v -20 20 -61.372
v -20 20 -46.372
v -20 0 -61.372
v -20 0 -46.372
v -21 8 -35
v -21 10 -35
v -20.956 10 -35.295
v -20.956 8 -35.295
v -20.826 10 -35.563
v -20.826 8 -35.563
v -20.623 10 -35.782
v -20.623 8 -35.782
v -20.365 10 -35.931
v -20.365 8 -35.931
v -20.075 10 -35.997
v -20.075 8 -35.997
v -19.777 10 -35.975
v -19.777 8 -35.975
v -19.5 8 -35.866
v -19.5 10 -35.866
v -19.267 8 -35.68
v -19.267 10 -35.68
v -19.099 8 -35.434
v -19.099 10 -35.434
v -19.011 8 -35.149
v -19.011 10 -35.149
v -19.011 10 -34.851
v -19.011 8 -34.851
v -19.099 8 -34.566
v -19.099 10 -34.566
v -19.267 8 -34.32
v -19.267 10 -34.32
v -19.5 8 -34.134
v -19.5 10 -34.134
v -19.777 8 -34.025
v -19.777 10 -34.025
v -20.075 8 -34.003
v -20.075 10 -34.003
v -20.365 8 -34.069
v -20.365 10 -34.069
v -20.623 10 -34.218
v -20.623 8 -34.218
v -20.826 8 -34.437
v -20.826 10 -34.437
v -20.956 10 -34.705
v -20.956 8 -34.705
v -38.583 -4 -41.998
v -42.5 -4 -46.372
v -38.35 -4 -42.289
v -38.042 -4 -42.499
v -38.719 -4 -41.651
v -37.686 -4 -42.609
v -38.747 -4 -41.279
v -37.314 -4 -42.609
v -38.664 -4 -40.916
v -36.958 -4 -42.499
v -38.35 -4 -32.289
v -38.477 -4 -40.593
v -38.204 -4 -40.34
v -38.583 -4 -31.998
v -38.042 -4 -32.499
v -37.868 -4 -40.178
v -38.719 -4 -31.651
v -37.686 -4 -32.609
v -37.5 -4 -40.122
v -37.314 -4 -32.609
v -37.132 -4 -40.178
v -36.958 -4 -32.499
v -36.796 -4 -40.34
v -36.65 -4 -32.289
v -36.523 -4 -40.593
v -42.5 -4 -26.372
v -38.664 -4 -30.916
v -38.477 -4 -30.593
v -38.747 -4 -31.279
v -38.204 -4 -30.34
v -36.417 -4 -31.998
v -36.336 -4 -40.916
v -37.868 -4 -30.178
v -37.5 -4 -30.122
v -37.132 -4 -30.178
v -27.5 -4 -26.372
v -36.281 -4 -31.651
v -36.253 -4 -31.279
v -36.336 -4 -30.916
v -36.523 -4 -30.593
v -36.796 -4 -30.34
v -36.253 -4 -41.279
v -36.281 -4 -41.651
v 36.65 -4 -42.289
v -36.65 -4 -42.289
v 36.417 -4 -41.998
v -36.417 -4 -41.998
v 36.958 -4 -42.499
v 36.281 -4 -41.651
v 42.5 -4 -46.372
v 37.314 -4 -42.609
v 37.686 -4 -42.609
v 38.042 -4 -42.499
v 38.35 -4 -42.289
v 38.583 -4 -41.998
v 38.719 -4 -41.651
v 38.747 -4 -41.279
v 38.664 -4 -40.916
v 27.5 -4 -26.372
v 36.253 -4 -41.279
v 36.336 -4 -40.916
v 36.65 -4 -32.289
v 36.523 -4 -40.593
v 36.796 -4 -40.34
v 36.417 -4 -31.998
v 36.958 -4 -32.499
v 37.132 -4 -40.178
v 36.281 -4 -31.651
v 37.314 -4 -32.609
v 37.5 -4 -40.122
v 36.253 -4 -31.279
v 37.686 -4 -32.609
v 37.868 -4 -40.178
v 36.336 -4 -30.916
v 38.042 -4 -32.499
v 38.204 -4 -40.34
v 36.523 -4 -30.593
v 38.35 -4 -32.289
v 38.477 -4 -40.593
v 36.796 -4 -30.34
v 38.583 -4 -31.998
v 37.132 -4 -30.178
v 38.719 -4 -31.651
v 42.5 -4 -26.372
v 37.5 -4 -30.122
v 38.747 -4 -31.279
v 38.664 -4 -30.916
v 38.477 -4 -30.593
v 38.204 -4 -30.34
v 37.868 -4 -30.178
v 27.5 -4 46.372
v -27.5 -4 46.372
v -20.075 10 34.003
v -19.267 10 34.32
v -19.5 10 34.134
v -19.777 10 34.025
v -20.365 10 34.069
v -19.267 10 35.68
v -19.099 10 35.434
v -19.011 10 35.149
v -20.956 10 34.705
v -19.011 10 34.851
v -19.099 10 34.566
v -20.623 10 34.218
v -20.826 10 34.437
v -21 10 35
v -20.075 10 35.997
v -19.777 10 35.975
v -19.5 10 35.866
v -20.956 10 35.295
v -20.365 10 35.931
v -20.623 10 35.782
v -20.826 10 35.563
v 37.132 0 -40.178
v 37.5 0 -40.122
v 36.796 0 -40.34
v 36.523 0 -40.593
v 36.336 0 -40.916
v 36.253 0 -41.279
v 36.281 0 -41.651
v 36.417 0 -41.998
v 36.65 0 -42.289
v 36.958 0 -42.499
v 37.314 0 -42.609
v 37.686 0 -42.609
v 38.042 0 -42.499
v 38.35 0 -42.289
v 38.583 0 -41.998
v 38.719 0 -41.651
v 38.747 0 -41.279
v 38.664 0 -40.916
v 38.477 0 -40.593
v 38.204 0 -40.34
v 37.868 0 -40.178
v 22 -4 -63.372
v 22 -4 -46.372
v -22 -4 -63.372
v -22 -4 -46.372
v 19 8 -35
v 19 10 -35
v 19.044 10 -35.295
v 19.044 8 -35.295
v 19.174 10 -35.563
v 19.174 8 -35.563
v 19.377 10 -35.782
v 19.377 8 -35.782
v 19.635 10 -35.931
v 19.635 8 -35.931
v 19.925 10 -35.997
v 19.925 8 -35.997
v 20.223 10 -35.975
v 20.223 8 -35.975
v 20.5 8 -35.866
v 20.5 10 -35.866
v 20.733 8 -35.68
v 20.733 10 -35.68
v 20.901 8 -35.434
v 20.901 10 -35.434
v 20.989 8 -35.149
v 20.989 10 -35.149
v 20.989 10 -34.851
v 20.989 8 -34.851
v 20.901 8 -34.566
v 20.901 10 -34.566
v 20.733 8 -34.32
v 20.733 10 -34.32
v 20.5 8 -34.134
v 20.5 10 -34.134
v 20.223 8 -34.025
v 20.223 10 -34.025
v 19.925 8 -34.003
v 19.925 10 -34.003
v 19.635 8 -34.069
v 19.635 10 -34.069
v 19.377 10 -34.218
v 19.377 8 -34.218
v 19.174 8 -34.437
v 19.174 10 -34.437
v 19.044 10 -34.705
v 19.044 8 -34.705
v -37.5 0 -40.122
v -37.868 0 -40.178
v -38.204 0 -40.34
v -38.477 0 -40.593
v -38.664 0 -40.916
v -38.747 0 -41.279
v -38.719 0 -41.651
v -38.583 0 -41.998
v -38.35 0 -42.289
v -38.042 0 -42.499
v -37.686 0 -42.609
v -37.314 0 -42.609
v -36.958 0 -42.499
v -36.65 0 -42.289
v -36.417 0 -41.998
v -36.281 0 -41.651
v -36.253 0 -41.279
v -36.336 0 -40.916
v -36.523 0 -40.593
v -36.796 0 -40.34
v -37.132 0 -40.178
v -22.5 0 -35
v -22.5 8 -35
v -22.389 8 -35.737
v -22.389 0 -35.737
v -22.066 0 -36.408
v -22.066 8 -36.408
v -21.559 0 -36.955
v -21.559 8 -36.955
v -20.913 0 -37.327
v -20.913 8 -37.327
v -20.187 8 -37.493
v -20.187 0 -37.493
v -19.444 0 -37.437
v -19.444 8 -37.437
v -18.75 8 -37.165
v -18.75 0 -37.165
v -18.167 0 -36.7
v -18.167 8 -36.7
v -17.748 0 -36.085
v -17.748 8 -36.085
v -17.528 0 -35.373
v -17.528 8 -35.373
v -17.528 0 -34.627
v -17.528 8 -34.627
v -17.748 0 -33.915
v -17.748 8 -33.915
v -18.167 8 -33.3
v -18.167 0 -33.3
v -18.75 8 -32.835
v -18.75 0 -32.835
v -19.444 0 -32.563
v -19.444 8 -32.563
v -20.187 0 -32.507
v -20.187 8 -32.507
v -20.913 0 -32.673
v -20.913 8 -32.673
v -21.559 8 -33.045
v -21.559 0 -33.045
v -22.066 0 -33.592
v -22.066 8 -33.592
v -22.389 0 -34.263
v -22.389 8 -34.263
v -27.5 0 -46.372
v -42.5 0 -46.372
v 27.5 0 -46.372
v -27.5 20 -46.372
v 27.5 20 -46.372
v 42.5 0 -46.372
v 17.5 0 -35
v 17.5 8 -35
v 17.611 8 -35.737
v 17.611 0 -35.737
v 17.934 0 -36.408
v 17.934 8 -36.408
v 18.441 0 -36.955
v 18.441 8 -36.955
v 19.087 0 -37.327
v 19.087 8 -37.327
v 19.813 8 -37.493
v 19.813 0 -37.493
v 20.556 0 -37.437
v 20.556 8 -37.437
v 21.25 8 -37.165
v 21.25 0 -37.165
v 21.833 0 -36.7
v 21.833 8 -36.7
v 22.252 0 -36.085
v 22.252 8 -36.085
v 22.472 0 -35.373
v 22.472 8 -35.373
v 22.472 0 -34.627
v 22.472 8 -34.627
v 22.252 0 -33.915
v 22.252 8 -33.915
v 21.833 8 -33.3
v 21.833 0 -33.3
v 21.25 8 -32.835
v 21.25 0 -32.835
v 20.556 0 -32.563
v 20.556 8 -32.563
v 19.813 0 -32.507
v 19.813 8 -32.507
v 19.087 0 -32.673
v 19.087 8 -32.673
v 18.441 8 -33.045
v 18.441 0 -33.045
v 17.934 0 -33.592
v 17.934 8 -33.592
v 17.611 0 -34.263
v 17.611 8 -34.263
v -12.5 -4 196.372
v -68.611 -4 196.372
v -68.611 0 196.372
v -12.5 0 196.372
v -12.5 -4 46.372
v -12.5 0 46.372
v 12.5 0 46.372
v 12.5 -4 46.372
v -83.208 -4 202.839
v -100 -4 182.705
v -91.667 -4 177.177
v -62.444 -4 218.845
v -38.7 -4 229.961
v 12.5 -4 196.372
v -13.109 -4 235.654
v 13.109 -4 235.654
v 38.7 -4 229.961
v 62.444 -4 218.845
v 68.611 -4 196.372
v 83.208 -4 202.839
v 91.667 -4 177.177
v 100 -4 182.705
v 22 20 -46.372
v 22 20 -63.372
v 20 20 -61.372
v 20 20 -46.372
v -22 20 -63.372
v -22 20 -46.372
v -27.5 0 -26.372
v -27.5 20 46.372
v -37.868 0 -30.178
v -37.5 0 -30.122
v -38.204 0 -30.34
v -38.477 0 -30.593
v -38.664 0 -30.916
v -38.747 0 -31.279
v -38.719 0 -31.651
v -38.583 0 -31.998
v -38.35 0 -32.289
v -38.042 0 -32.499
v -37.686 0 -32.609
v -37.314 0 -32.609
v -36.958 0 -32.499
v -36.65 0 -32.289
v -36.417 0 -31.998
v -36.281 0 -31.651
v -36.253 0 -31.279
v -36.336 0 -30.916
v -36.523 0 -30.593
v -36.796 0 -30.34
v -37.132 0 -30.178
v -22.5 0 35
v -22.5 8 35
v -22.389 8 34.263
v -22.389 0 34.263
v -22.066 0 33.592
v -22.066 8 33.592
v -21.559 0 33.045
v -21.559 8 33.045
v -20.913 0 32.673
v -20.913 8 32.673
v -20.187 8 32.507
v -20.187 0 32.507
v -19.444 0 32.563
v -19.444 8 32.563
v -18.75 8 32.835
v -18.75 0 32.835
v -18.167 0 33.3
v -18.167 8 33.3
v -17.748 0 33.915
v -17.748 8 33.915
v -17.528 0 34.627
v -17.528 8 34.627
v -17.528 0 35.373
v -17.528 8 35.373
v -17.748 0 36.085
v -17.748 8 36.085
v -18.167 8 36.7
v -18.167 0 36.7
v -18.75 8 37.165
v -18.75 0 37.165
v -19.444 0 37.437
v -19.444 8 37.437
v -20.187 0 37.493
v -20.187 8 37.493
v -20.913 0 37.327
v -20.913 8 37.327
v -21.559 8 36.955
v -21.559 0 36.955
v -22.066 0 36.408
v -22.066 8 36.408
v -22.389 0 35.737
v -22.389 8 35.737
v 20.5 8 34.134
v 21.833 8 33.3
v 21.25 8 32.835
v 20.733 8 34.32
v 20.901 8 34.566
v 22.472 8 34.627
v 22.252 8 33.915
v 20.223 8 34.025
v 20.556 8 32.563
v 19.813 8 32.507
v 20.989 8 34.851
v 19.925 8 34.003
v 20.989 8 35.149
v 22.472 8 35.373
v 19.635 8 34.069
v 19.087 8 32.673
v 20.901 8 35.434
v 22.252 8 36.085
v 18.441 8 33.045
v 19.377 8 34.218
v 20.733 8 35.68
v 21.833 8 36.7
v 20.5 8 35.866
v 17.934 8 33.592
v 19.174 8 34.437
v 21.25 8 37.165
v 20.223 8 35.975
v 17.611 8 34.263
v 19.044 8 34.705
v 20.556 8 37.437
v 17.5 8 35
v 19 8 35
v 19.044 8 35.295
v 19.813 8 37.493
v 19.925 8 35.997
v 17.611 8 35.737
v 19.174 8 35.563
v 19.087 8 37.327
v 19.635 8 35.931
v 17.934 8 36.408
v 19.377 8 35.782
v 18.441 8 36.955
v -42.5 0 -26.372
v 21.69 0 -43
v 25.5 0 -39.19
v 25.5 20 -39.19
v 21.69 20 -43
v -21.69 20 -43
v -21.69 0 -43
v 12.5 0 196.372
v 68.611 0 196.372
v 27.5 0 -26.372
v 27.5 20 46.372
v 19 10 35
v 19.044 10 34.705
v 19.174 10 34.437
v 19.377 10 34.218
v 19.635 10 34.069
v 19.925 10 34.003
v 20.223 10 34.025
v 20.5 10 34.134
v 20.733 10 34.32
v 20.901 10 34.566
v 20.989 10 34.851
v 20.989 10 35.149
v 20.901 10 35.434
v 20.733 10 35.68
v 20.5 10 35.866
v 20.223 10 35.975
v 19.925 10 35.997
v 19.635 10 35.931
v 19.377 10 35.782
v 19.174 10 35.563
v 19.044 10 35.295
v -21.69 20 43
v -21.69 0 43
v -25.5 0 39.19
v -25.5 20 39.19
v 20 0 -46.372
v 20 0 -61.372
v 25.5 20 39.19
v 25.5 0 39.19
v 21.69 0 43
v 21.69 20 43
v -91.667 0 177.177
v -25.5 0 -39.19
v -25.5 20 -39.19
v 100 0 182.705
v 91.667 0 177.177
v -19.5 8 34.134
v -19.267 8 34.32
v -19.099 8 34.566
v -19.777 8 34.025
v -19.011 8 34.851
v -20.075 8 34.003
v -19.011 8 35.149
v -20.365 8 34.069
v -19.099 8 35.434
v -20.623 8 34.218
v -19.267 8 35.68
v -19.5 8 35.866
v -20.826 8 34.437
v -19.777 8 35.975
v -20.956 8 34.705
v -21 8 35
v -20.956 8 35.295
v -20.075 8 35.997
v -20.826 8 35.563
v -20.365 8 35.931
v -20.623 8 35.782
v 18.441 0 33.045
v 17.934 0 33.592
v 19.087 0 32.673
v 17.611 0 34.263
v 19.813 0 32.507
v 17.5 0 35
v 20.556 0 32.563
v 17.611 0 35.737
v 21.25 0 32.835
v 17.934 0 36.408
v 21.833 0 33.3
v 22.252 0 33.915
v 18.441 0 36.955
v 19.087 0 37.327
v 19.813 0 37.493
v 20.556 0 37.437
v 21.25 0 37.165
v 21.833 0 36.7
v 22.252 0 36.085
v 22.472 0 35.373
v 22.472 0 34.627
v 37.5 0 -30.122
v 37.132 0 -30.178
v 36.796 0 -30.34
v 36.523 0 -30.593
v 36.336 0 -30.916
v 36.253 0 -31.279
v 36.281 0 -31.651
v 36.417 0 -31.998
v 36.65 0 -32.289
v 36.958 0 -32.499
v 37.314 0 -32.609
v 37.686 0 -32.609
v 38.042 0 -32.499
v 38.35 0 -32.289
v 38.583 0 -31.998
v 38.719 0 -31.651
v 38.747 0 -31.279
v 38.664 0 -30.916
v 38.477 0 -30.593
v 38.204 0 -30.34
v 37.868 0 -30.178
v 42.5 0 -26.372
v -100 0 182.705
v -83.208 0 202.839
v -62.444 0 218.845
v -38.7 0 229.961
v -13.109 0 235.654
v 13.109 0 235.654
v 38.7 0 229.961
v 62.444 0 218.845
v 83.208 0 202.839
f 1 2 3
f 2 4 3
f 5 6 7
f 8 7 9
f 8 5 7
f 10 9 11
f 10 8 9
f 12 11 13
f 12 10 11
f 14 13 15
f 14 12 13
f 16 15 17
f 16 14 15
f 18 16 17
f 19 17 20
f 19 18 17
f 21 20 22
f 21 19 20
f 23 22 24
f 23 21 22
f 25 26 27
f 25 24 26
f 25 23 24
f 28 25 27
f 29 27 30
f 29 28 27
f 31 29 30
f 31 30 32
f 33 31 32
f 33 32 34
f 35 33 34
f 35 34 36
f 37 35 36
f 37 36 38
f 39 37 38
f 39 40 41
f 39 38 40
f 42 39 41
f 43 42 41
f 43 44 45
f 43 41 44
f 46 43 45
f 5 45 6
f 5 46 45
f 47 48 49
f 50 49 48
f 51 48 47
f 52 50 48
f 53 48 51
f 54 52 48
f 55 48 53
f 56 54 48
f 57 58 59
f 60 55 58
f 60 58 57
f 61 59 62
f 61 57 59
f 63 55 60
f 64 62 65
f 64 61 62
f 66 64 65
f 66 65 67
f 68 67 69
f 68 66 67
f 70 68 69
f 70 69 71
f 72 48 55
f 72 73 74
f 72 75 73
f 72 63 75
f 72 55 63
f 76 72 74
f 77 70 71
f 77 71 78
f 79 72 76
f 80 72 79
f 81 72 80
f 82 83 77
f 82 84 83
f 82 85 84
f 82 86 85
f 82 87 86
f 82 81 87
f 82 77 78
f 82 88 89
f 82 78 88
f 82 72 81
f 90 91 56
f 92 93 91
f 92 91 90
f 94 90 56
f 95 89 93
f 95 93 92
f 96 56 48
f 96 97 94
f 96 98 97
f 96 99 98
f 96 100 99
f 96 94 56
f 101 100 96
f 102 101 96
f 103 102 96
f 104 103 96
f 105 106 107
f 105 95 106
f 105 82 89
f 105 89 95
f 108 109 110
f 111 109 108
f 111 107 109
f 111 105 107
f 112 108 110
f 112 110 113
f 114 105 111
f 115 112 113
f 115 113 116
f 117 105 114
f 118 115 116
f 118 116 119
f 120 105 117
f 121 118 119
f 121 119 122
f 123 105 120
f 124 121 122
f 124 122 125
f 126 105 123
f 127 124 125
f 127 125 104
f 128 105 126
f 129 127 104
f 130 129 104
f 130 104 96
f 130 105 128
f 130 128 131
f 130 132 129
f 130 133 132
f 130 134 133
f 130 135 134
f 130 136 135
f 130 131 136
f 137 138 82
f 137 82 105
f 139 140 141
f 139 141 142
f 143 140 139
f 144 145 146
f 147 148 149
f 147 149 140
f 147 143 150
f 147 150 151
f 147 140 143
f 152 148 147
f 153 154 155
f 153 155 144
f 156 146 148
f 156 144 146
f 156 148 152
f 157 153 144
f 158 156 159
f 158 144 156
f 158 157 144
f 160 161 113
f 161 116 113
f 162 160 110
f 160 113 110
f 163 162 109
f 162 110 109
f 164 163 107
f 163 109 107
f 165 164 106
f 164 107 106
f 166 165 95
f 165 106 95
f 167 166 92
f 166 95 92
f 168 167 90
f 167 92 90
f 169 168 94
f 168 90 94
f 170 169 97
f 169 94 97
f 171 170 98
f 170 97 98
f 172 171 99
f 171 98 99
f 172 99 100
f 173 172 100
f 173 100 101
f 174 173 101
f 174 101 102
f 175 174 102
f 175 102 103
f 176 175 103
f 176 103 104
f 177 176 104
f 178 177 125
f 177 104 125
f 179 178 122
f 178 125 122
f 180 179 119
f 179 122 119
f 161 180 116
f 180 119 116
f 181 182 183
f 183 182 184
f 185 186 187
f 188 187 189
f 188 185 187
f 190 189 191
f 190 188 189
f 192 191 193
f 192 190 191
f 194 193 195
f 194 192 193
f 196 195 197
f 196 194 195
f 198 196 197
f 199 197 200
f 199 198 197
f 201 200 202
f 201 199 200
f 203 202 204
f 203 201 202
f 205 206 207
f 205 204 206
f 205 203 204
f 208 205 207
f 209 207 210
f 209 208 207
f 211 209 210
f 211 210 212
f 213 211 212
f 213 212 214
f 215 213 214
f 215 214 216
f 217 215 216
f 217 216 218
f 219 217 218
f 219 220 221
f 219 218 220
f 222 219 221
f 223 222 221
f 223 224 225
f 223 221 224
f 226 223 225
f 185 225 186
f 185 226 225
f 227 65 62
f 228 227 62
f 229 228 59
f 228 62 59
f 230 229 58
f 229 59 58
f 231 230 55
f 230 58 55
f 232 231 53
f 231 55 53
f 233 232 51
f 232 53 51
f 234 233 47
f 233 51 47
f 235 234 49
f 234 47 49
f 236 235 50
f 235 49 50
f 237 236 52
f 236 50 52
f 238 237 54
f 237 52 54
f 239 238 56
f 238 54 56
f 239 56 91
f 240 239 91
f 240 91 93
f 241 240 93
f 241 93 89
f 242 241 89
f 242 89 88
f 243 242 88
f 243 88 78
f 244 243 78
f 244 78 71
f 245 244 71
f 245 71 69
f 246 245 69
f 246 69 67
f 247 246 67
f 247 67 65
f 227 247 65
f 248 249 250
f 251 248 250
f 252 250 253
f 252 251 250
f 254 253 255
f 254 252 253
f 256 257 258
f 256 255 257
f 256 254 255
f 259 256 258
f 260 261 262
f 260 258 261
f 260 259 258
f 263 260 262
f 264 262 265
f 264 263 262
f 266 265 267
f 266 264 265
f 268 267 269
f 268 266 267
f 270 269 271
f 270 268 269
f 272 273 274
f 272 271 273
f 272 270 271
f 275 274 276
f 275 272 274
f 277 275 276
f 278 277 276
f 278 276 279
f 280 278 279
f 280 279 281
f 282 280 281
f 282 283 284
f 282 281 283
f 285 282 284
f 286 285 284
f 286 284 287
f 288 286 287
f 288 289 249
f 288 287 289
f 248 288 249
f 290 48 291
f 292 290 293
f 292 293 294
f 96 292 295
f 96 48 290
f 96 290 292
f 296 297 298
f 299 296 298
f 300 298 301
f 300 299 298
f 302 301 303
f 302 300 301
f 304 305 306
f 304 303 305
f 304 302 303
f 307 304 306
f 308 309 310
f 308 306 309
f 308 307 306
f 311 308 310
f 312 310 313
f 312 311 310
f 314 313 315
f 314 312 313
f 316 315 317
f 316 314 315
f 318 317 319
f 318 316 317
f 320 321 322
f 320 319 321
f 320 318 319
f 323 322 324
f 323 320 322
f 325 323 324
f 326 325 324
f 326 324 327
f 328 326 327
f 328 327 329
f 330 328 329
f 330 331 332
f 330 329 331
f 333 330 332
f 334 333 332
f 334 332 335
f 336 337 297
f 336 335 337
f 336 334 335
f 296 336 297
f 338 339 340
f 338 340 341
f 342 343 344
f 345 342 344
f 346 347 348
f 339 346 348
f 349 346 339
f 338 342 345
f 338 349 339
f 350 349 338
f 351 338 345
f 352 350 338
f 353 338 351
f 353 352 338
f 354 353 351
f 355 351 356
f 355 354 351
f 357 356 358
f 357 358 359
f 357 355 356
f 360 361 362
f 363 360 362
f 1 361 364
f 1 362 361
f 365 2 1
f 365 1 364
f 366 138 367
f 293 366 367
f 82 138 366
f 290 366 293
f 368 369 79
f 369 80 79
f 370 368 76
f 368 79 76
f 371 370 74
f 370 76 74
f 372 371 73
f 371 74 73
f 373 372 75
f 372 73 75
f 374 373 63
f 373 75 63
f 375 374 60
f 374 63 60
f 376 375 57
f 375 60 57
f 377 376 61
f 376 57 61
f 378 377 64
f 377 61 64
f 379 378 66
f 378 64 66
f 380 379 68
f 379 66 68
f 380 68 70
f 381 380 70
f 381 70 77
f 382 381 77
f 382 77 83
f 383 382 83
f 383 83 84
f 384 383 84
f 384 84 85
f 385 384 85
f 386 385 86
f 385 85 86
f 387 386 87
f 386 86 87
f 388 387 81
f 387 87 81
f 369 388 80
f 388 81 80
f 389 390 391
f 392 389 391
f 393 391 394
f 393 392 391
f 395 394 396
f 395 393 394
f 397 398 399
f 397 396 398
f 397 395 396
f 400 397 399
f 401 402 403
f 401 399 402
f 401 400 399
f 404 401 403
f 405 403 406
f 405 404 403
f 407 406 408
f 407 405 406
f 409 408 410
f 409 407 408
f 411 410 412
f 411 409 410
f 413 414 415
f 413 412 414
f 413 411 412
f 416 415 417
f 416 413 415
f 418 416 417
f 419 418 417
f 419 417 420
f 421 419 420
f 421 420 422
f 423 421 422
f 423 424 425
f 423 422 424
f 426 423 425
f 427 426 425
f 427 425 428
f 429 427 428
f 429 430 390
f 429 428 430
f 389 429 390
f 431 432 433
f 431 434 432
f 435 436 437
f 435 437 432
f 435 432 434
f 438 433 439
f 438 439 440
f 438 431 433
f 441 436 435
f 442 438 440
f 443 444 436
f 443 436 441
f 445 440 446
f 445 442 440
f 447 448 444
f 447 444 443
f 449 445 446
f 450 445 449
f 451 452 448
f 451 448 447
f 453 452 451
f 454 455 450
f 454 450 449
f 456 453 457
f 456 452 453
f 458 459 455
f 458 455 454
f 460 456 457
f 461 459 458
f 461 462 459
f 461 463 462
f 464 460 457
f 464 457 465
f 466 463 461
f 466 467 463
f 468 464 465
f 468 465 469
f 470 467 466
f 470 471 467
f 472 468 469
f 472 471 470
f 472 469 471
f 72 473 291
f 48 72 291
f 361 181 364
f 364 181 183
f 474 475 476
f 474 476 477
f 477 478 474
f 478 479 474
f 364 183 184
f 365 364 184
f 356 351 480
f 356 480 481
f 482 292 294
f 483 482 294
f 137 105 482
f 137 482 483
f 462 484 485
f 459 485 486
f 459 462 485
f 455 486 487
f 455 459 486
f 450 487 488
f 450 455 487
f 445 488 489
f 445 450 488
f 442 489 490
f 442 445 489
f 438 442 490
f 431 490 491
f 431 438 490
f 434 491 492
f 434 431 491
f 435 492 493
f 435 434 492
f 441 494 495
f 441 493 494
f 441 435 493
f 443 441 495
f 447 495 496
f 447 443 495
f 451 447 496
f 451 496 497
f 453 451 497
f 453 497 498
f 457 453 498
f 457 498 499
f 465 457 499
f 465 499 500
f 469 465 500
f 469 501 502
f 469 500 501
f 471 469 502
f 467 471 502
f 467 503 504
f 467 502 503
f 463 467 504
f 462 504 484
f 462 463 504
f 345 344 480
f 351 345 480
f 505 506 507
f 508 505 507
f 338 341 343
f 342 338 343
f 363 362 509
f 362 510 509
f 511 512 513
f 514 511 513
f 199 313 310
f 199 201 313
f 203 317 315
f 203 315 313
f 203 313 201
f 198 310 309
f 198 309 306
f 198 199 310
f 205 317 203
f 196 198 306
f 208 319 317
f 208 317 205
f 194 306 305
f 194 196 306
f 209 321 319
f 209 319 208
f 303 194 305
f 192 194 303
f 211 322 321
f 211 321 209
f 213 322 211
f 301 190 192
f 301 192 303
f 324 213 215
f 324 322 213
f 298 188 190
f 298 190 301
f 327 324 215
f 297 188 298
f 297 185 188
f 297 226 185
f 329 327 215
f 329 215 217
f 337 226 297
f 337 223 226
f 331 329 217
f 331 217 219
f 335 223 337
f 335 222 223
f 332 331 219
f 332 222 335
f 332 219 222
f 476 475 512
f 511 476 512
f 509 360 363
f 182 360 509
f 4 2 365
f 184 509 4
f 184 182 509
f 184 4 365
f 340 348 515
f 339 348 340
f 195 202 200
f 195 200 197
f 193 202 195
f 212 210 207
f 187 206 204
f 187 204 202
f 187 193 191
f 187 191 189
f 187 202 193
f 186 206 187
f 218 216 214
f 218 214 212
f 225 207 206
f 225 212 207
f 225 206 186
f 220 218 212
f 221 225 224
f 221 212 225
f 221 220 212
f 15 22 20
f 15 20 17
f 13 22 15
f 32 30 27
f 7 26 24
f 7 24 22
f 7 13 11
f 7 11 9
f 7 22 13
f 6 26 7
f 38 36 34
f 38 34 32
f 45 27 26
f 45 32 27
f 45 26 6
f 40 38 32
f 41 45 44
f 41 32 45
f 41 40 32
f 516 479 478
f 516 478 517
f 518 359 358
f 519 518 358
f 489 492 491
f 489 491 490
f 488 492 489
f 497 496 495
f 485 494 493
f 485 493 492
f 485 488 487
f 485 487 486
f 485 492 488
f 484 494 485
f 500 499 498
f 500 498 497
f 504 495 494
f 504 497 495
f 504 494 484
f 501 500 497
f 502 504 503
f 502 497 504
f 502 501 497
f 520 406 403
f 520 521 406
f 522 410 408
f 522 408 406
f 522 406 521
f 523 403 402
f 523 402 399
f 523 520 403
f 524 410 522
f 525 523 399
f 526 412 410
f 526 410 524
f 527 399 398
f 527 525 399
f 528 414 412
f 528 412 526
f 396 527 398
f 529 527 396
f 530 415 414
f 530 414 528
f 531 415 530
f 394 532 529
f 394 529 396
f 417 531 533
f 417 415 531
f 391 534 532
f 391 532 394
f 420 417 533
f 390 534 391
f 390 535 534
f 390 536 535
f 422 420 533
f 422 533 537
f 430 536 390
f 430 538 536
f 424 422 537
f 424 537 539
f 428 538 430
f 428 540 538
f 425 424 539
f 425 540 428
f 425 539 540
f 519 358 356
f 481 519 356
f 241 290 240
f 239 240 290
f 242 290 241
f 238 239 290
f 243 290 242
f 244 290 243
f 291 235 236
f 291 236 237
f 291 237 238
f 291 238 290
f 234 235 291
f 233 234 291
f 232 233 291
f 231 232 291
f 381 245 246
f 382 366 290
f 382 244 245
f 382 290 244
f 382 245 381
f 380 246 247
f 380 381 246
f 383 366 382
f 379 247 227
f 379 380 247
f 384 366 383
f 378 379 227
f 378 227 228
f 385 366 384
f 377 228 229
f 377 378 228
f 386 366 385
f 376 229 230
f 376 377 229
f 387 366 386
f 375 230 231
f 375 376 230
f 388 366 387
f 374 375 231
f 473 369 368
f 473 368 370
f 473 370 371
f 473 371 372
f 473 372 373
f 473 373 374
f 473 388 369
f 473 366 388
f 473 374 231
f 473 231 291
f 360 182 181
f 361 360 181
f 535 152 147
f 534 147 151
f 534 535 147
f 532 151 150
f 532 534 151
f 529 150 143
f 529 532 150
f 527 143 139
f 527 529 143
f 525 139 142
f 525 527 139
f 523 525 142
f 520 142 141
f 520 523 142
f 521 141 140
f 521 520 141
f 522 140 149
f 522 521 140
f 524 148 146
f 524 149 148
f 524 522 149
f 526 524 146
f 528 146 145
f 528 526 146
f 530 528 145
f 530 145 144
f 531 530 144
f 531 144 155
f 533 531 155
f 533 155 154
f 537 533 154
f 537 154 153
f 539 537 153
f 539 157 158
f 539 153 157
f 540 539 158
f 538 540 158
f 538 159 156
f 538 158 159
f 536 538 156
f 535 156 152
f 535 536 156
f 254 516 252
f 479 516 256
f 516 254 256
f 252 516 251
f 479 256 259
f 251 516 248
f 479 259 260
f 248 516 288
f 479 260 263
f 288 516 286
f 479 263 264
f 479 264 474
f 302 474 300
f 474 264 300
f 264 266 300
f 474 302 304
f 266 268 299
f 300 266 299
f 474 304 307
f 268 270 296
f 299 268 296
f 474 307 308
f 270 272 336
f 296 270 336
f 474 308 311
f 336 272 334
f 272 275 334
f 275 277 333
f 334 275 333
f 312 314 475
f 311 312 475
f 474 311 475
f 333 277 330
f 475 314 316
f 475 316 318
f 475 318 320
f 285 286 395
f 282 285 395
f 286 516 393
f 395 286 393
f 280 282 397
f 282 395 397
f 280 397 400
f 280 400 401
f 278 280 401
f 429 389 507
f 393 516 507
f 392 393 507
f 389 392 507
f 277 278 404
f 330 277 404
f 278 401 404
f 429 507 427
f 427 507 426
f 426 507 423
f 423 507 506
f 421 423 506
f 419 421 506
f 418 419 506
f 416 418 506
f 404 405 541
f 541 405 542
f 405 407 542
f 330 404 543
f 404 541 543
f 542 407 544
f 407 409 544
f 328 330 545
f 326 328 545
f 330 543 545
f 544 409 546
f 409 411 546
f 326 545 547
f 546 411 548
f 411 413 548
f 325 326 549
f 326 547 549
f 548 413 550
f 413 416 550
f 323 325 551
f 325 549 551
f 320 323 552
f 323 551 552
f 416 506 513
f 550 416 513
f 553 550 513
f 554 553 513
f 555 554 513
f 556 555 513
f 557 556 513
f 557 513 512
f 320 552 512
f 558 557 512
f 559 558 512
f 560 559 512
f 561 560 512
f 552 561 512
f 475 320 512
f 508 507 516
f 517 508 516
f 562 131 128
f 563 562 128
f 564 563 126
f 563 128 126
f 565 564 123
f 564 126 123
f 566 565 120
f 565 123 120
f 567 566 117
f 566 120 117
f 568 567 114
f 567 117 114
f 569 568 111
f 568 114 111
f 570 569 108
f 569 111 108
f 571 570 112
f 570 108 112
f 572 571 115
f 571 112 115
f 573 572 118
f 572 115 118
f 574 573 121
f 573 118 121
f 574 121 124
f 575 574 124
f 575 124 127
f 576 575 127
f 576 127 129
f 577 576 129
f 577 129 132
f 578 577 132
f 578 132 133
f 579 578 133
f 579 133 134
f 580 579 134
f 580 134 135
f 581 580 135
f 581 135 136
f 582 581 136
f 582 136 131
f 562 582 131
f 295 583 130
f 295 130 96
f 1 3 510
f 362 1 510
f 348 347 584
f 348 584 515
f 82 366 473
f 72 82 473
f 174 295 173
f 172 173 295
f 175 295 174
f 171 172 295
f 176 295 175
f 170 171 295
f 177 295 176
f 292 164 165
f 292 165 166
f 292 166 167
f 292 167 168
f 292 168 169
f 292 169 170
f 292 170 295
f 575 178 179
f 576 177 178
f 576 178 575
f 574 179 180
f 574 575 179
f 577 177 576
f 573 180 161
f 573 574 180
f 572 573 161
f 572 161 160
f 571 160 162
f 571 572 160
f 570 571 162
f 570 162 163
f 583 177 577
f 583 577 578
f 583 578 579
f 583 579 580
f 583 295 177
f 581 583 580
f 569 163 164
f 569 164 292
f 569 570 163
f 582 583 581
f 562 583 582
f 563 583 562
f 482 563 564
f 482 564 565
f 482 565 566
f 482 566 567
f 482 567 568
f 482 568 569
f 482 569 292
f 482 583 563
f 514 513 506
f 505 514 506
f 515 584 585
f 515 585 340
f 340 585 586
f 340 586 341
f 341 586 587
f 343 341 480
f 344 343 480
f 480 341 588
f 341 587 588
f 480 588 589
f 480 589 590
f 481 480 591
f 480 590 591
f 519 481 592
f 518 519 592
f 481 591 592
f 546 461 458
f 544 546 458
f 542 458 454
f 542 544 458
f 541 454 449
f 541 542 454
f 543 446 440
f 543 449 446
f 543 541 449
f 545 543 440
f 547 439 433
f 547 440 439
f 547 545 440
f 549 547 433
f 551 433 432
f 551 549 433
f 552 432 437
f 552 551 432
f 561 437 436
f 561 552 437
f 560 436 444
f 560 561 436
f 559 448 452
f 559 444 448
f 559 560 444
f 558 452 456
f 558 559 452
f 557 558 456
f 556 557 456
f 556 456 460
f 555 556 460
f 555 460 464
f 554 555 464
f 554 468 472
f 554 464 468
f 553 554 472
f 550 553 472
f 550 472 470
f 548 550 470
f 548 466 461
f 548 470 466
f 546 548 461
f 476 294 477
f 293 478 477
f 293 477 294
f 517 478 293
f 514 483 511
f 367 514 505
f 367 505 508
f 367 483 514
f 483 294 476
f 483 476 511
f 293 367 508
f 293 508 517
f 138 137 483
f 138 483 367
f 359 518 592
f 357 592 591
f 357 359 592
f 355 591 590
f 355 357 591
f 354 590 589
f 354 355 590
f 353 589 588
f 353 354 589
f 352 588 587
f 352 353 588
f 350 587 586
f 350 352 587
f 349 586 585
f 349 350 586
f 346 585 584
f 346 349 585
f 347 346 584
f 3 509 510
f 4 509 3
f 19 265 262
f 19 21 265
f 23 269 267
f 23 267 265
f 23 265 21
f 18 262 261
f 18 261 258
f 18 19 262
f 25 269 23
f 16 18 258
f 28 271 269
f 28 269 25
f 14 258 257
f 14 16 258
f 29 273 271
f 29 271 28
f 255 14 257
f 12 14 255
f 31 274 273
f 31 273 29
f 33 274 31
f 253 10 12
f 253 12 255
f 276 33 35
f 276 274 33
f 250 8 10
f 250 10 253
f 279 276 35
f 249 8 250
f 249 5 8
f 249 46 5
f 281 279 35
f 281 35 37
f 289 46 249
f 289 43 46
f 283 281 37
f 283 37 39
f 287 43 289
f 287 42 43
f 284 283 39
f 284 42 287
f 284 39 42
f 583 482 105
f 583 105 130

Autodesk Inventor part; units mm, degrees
ref_plane "YZ Plane" through (0, 0, 0) normal (1, 0, 0) x (0, 1, 0)
ref_plane "XZ Plane" through (0, 0, 0) normal (0, 1, 0) x (-1, 0, 0)
ref_plane "XY Plane" through (0, 0, 0) normal (0, 0, 1) x (1, 0, 0)
sketch "Sketch1" plane through (0, 0, 0) normal (0, 1, 0) x (-1, 0, 0)
  line L0 (-21.69, 43) -> (21.69, 43)
  line L1 (25.5, 39.19) -> (25.5, -39.19)
  line L2 (21.69, -43) -> (-21.69, -43)
  line L3 (-25.5, -39.19) -> (-25.5, 39.19)
  line L4 (-25.5, 43) -> (25.5, -43) construction
  line L5 (25.5, 43) -> (-25.5, -43) construction
  line L6 (-25.5, 39.19) -> (-21.69, 43)
  line L7 (21.69, 43) -> (25.5, 39.19)
  line L8 (21.69, -43) -> (25.5, -39.19)
  line L9 (-25.5, -39.19) -> (-21.69, -43)
  line L10 (-27.5, 46.3725) -> (27.5, 46.3725)
  line L11 (27.5, 46.3725) -> (27.5, -46.3725)
  line L12 (27.5, -46.3725) -> (-27.5, -46.3725)
  line L13 (-27.5, -46.3725) -> (-27.5, 46.3725)
  line L14 (-27.5, 46.3725) -> (27.5, -46.3725) construction
  line L15 (27.5, 46.3725) -> (-27.5, -46.3725) construction
  point P0 (0, 0)
  dimension "d0" = 86
  dimension "d1" = 51
  dimension "d2" = 3.81
  dimension "d3" = 3.81
  dimension "d4" = 3.81
  dimension "d5" = 3.81
  dimension "d6" = 3.81
  dimension "d7" = 3.81
  dimension "d8" = 3.81
  dimension "d9" = 3.81
  dimension "d10" = 2
extrude "Extrusion1" add sketch "Sketch1" along normal blind 20
sketch "Sketch2" plane through (0, 0, 0) normal (0, 1, 0) x (-1, 0, 0)
  circle A0 centre (20, 35) radius 2.5
  line L0 (0, -52.5) -> (0, 52.5) projected
  line L1 (31.5, 0) -> (-31.5, 0) projected
  circle A1 centre (20, 35) radius 1
  circle A2 centre (20, -35) radius 2.5
  circle A3 centre (20, -35) radius 1
  circle A4 centre (-20, 35) radius 2.5
  circle A5 centre (-20, 35) radius 1
  circle A6 centre (-20, -35) radius 2.5
  circle A7 centre (-20, -35) radius 1
  point P0 (0, 0)
  dimension "d13" = 5
  dimension "d14" = 2
  dimension "d15" = 40
  dimension "d16" = 70
extrude "Extrusion2" add sketch "Sketch2" along normal blind 8 contours A0 | A1 | A2 | A3 | A4 | A5 | A6 | A7
extrude "Extrusion3" add sketch "Sketch2" along normal blind 10 contours A1 | A3 | A5 | A7
sketch "Sketch3" plane through (0, 0, 0) normal (0, -1, 0) x (1, 0, 0)
  line L0 (-21.69, 43) -> (21.69, 43) projected
  line L1 (21.69, 43) -> (25.5, 39.19) projected
  line L2 (25.5, 39.19) -> (25.5, -39.19) projected
  line L3 (25.5, -39.19) -> (21.69, -43) projected
  line L4 (21.69, -43) -> (-21.69, -43) projected
  line L5 (-21.69, -43) -> (-25.5, -39.19) projected
  line L6 (-25.5, -39.19) -> (-25.5, 39.19) projected
  line L7 (-25.5, 39.19) -> (-21.69, 43) projected
  line L8 (27.5, 46.3725) -> (-27.5, 46.3725) projected
  line L9 (-27.5, 46.3725) -> (-27.5, -46.3725) projected
  line L10 (-27.5, -46.3725) -> (27.5, -46.3725) projected
  line L11 (27.5, -46.3725) -> (27.5, 46.3725) projected
  point P0 (0, 0)
extrude "Extrusion4" add sketch "Sketch3" along normal blind 4 contours L0 L1 L2 L3 L4 L5 L6 L7 | L11 L10 L9 L8
sketch "Sketch4" plane through (0, 0, 0) normal (0, 1, 0) x (-1, 0, 0)
  line L0 (0, -39.2745) -> (0, 235.6471) projected
  line L1 (-12.5, 196.3725) -> (12.5, 196.3725)
  line L2 (12.5, 196.3725) -> (12.5, 46.3725)
  line L3 (12.5, 46.3725) -> (-12.5, 46.3725)
  line L4 (-12.5, 46.3725) -> (-12.5, 196.3725)
  line L5 (-12.5, 196.3725) -> (12.5, 46.3725) construction
  line L6 (12.5, 196.3725) -> (-12.5, 46.3725) construction
  line L7 (27.5, 46.3725) -> (-27.5, 46.3725) projected
  point P0 (0, 0)
  point P1 (0, 121.3725)
  dimension "d23" = 25
  dimension "d24" = 150
extrude "Extrusion5" add sketch "Sketch4" against normal blind 4 separate body
sketch "Sketch5" plane through (0, -4, 0) normal (0, -1, 0) x (1, 0, 0)
  line L0 (0, -102.9216) -> (0, 292.9216) projected
  arc A0 (100, 182.705) -> (-100, 182.705) centre (0, 116.3725) ccw
  line L1 (100, 182.705) -> (91.6667, 177.1773)
  line L2 (91.6667, 177.1773) -> (68.6114, 196.3725)
  line L3 (68.6114, 196.3725) -> (0, 196.3725)
  line L4 (-100, 182.705) -> (-91.6667, 177.1773)
  line L5 (-91.6667, 177.1773) -> (-68.6114, 196.3725)
  line L6 (-68.6114, 196.3725) -> (0, 196.3725)
  line L7 (12.5, 196.3725) -> (-12.5, 196.3725) projected
  point P0 (0, 0)
  dimension "d29" = 120
  dimension "d31" = 100
  dimension "d32" = 100
  dimension "d33" = 10
  dimension "d34" = 80
  dimension "d35" = 30
extrude "Extrusion6" add sketch "Sketch5" against normal blind 4 bodies 2
sketch "Sketch6" plane through (0, 0, 0) normal (0, 1, 0) x (-1, 0, 0)
  line L0 (-20, -46.3725) -> (20, -46.3725)
  line L1 (20, -46.3725) -> (20, -61.3725)
  line L2 (20, -61.3725) -> (-20, -61.3725)
  line L3 (-20, -61.3725) -> (-20, -46.3725)
  line L4 (-20, -46.3725) -> (20, -61.3725) construction
  line L5 (20, -46.3725) -> (-20, -61.3725) construction
  line L6 (-27.5, -46.3725) -> (27.5, -46.3725) projected
  line L7 (-22, -63.3725) -> (22, -63.3725)
  line L8 (22, -63.3725) -> (22, -46.3725)
  line L9 (22, -46.3725) -> (-22, -46.3725)
  line L10 (-22, -46.3725) -> (-22, -63.3725)
  line L11 (-22, -63.3725) -> (22, -46.3725) construction
  line L12 (22, -63.3725) -> (-22, -46.3725) construction
  line L13 (0, -76.0471) -> (0, 12.6745) projected
  point P0 (0, 0)
  point P1 (0, -53.8725)
  point P2 (0, -54.8725)
  point P3 (0, -54.8725)
  point P4 (0, -53.8725)
  dimension "d38" = 40
  dimension "d39" = 15
  dimension "d40" = 2
  dimension "d41" = 2
extrude "Extrusion7" add sketch "Sketch6" along normal blind 20 separate body contours L3 L2 L13 L7 L10 L6 | L6 L8 L7 L13 L2 L1
extrude "Extrusion8" add sketch "Sketch6" against normal blind 4 bodies 3
sketch "Sketch7" plane through (0, 0, 0) normal (0, 1, 0) x (-1, 0, 0)
  line L0 (-27.5, -26.3725) -> (-42.5, -26.3725)
  line L1 (-42.5, -26.3725) -> (-42.5, -46.3725)
  line L2 (-42.5, -46.3725) -> (-27.5, -46.3725)
  line L3 (-27.5, -46.3725) -> (-27.5, -26.3725)
  line L4 (-27.5, -26.3725) -> (-42.5, -46.3725) construction
  line L5 (-42.5, -26.3725) -> (-27.5, -46.3725) construction
  line L6 (-27.5, 46.3725) -> (-27.5, -46.3725) projected
  line L7 (-27.5, -46.3725) -> (27.5, -46.3725) projected
  line L8 (0, -123.3216) -> (0, 296.3216) projected
  line L9 (27.5, -26.3725) -> (42.5, -26.3725)
  line L10 (42.5, -26.3725) -> (42.5, -46.3725)
  line L11 (42.5, -46.3725) -> (27.5, -46.3725)
  line L12 (27.5, -46.3725) -> (27.5, -26.3725)
  point P0 (0, 0)
  point P1 (-35, -36.3725)
  dimension "d46" = 20
  dimension "d47" = 15
extrude "Extrusion9" add sketch "Sketch7" against normal blind 4 bodies 1
sketch "Sketch8" plane through (0, 0, 0) normal (0, 1, 0) x (1, 0, 0)
  line L0 (-55.7062, 36.3725) -> (-34.5441, 36.3725) construction
  line L1 (-42.5, 46.3725) -> (-27.5, 46.3725) projected
  line L2 (-42.5, 26.3725) -> (-42.5, 46.3725) projected
  line L3 (0, 123.3216) -> (0, -296.3216) projected
  point P0 (0, 0)
  point P1 (-37.5, 31.3725)
  point P2 (-37.5, 41.3725)
  point P3 (37.5, 31.3725)
  point P4 (37.5, 41.3725)
  dimension "d50" = 10
  dimension "d51" = 10
  dimension "d52" = 5
hole "Hole1" at (-37.5, 0, -31.3725) at (-37.5, 0, -41.3725) at (37.5, 0, -31.3725) at (37.5, 0, -41.3725) direction (0, -1, 0) diameter 2.5 end through all bodies 1
equation "\"d2\" = Chamfer_PCB"
equation "\"d3\" = d2"
equation "\"d4\" = Chamfer_PCB"
equation "\"d5\" = d4"
equation "\"d6\" = Chamfer_PCB"
equation "\"d7\" = d6"
equation "\"d8\" = Chamfer_PCB"
equation "\"d9\" = d8"
equation "\"d11\" = 2 * HU_PCB"
equation "\"d15\" = DIH_PCB"
equation "\"d16\" = DOH_PCB"
equation "\"d19\" = HU_PCB"
equation "\"d21\" = H_Wall"
equation "\"d23\" = 0.5 * W_PCB"
equation "\"d24\" = L_PCBToSensor"
equation "\"d25\" = H_Wall"
equation "\"d31\" = 0.5 * W_MaxWidth"
equation "\"d32\" = d31"
equation "\"d36\" = H_Wall"
equation "\"d38\" = L_LiPo_245mAh"
equation "\"d39\" = H_LiPo_245mAh"
equation "\"d40\" = 0.5 * H_Wall"
equation "\"d41\" = d40"
equation "\"d42\" = W_LiPo_245mAh"
equation "\"d44\" = H_Wall"
equation "\"d46\" = 2 * DSH_Motor"
equation "\"d48\" = H_Wall"
equation "\"d50\" = DSH_Motor"
equation "\"d51\" = DSH_Motor"
equation "\"d52\" = 0.5 * DSH_Motor"
equation "\"HU_PCB\" = 10"
equation "\"L_PCB\" = 85"
equation "\"DIH_PCB\" = 40"
equation "\"DOH_PCB\" = 70"
equation "\"Chamfer_PCB\" = 3.81"
equation "\"L_PCBToSensor\" = 150"
equation "\"H_Wall\" = 4"
equation "\"W_LiPo_245mAh\" = 20"
equation "\"H_LiPo_245mAh\" = 15"
equation "\"L_LiPo_245mAh\" = 40"
equation "\"DSH_Motor\" = 10"
equation "\"W_PCB\" = 50"
equation "\"W_MaxWidth\" = 200"
